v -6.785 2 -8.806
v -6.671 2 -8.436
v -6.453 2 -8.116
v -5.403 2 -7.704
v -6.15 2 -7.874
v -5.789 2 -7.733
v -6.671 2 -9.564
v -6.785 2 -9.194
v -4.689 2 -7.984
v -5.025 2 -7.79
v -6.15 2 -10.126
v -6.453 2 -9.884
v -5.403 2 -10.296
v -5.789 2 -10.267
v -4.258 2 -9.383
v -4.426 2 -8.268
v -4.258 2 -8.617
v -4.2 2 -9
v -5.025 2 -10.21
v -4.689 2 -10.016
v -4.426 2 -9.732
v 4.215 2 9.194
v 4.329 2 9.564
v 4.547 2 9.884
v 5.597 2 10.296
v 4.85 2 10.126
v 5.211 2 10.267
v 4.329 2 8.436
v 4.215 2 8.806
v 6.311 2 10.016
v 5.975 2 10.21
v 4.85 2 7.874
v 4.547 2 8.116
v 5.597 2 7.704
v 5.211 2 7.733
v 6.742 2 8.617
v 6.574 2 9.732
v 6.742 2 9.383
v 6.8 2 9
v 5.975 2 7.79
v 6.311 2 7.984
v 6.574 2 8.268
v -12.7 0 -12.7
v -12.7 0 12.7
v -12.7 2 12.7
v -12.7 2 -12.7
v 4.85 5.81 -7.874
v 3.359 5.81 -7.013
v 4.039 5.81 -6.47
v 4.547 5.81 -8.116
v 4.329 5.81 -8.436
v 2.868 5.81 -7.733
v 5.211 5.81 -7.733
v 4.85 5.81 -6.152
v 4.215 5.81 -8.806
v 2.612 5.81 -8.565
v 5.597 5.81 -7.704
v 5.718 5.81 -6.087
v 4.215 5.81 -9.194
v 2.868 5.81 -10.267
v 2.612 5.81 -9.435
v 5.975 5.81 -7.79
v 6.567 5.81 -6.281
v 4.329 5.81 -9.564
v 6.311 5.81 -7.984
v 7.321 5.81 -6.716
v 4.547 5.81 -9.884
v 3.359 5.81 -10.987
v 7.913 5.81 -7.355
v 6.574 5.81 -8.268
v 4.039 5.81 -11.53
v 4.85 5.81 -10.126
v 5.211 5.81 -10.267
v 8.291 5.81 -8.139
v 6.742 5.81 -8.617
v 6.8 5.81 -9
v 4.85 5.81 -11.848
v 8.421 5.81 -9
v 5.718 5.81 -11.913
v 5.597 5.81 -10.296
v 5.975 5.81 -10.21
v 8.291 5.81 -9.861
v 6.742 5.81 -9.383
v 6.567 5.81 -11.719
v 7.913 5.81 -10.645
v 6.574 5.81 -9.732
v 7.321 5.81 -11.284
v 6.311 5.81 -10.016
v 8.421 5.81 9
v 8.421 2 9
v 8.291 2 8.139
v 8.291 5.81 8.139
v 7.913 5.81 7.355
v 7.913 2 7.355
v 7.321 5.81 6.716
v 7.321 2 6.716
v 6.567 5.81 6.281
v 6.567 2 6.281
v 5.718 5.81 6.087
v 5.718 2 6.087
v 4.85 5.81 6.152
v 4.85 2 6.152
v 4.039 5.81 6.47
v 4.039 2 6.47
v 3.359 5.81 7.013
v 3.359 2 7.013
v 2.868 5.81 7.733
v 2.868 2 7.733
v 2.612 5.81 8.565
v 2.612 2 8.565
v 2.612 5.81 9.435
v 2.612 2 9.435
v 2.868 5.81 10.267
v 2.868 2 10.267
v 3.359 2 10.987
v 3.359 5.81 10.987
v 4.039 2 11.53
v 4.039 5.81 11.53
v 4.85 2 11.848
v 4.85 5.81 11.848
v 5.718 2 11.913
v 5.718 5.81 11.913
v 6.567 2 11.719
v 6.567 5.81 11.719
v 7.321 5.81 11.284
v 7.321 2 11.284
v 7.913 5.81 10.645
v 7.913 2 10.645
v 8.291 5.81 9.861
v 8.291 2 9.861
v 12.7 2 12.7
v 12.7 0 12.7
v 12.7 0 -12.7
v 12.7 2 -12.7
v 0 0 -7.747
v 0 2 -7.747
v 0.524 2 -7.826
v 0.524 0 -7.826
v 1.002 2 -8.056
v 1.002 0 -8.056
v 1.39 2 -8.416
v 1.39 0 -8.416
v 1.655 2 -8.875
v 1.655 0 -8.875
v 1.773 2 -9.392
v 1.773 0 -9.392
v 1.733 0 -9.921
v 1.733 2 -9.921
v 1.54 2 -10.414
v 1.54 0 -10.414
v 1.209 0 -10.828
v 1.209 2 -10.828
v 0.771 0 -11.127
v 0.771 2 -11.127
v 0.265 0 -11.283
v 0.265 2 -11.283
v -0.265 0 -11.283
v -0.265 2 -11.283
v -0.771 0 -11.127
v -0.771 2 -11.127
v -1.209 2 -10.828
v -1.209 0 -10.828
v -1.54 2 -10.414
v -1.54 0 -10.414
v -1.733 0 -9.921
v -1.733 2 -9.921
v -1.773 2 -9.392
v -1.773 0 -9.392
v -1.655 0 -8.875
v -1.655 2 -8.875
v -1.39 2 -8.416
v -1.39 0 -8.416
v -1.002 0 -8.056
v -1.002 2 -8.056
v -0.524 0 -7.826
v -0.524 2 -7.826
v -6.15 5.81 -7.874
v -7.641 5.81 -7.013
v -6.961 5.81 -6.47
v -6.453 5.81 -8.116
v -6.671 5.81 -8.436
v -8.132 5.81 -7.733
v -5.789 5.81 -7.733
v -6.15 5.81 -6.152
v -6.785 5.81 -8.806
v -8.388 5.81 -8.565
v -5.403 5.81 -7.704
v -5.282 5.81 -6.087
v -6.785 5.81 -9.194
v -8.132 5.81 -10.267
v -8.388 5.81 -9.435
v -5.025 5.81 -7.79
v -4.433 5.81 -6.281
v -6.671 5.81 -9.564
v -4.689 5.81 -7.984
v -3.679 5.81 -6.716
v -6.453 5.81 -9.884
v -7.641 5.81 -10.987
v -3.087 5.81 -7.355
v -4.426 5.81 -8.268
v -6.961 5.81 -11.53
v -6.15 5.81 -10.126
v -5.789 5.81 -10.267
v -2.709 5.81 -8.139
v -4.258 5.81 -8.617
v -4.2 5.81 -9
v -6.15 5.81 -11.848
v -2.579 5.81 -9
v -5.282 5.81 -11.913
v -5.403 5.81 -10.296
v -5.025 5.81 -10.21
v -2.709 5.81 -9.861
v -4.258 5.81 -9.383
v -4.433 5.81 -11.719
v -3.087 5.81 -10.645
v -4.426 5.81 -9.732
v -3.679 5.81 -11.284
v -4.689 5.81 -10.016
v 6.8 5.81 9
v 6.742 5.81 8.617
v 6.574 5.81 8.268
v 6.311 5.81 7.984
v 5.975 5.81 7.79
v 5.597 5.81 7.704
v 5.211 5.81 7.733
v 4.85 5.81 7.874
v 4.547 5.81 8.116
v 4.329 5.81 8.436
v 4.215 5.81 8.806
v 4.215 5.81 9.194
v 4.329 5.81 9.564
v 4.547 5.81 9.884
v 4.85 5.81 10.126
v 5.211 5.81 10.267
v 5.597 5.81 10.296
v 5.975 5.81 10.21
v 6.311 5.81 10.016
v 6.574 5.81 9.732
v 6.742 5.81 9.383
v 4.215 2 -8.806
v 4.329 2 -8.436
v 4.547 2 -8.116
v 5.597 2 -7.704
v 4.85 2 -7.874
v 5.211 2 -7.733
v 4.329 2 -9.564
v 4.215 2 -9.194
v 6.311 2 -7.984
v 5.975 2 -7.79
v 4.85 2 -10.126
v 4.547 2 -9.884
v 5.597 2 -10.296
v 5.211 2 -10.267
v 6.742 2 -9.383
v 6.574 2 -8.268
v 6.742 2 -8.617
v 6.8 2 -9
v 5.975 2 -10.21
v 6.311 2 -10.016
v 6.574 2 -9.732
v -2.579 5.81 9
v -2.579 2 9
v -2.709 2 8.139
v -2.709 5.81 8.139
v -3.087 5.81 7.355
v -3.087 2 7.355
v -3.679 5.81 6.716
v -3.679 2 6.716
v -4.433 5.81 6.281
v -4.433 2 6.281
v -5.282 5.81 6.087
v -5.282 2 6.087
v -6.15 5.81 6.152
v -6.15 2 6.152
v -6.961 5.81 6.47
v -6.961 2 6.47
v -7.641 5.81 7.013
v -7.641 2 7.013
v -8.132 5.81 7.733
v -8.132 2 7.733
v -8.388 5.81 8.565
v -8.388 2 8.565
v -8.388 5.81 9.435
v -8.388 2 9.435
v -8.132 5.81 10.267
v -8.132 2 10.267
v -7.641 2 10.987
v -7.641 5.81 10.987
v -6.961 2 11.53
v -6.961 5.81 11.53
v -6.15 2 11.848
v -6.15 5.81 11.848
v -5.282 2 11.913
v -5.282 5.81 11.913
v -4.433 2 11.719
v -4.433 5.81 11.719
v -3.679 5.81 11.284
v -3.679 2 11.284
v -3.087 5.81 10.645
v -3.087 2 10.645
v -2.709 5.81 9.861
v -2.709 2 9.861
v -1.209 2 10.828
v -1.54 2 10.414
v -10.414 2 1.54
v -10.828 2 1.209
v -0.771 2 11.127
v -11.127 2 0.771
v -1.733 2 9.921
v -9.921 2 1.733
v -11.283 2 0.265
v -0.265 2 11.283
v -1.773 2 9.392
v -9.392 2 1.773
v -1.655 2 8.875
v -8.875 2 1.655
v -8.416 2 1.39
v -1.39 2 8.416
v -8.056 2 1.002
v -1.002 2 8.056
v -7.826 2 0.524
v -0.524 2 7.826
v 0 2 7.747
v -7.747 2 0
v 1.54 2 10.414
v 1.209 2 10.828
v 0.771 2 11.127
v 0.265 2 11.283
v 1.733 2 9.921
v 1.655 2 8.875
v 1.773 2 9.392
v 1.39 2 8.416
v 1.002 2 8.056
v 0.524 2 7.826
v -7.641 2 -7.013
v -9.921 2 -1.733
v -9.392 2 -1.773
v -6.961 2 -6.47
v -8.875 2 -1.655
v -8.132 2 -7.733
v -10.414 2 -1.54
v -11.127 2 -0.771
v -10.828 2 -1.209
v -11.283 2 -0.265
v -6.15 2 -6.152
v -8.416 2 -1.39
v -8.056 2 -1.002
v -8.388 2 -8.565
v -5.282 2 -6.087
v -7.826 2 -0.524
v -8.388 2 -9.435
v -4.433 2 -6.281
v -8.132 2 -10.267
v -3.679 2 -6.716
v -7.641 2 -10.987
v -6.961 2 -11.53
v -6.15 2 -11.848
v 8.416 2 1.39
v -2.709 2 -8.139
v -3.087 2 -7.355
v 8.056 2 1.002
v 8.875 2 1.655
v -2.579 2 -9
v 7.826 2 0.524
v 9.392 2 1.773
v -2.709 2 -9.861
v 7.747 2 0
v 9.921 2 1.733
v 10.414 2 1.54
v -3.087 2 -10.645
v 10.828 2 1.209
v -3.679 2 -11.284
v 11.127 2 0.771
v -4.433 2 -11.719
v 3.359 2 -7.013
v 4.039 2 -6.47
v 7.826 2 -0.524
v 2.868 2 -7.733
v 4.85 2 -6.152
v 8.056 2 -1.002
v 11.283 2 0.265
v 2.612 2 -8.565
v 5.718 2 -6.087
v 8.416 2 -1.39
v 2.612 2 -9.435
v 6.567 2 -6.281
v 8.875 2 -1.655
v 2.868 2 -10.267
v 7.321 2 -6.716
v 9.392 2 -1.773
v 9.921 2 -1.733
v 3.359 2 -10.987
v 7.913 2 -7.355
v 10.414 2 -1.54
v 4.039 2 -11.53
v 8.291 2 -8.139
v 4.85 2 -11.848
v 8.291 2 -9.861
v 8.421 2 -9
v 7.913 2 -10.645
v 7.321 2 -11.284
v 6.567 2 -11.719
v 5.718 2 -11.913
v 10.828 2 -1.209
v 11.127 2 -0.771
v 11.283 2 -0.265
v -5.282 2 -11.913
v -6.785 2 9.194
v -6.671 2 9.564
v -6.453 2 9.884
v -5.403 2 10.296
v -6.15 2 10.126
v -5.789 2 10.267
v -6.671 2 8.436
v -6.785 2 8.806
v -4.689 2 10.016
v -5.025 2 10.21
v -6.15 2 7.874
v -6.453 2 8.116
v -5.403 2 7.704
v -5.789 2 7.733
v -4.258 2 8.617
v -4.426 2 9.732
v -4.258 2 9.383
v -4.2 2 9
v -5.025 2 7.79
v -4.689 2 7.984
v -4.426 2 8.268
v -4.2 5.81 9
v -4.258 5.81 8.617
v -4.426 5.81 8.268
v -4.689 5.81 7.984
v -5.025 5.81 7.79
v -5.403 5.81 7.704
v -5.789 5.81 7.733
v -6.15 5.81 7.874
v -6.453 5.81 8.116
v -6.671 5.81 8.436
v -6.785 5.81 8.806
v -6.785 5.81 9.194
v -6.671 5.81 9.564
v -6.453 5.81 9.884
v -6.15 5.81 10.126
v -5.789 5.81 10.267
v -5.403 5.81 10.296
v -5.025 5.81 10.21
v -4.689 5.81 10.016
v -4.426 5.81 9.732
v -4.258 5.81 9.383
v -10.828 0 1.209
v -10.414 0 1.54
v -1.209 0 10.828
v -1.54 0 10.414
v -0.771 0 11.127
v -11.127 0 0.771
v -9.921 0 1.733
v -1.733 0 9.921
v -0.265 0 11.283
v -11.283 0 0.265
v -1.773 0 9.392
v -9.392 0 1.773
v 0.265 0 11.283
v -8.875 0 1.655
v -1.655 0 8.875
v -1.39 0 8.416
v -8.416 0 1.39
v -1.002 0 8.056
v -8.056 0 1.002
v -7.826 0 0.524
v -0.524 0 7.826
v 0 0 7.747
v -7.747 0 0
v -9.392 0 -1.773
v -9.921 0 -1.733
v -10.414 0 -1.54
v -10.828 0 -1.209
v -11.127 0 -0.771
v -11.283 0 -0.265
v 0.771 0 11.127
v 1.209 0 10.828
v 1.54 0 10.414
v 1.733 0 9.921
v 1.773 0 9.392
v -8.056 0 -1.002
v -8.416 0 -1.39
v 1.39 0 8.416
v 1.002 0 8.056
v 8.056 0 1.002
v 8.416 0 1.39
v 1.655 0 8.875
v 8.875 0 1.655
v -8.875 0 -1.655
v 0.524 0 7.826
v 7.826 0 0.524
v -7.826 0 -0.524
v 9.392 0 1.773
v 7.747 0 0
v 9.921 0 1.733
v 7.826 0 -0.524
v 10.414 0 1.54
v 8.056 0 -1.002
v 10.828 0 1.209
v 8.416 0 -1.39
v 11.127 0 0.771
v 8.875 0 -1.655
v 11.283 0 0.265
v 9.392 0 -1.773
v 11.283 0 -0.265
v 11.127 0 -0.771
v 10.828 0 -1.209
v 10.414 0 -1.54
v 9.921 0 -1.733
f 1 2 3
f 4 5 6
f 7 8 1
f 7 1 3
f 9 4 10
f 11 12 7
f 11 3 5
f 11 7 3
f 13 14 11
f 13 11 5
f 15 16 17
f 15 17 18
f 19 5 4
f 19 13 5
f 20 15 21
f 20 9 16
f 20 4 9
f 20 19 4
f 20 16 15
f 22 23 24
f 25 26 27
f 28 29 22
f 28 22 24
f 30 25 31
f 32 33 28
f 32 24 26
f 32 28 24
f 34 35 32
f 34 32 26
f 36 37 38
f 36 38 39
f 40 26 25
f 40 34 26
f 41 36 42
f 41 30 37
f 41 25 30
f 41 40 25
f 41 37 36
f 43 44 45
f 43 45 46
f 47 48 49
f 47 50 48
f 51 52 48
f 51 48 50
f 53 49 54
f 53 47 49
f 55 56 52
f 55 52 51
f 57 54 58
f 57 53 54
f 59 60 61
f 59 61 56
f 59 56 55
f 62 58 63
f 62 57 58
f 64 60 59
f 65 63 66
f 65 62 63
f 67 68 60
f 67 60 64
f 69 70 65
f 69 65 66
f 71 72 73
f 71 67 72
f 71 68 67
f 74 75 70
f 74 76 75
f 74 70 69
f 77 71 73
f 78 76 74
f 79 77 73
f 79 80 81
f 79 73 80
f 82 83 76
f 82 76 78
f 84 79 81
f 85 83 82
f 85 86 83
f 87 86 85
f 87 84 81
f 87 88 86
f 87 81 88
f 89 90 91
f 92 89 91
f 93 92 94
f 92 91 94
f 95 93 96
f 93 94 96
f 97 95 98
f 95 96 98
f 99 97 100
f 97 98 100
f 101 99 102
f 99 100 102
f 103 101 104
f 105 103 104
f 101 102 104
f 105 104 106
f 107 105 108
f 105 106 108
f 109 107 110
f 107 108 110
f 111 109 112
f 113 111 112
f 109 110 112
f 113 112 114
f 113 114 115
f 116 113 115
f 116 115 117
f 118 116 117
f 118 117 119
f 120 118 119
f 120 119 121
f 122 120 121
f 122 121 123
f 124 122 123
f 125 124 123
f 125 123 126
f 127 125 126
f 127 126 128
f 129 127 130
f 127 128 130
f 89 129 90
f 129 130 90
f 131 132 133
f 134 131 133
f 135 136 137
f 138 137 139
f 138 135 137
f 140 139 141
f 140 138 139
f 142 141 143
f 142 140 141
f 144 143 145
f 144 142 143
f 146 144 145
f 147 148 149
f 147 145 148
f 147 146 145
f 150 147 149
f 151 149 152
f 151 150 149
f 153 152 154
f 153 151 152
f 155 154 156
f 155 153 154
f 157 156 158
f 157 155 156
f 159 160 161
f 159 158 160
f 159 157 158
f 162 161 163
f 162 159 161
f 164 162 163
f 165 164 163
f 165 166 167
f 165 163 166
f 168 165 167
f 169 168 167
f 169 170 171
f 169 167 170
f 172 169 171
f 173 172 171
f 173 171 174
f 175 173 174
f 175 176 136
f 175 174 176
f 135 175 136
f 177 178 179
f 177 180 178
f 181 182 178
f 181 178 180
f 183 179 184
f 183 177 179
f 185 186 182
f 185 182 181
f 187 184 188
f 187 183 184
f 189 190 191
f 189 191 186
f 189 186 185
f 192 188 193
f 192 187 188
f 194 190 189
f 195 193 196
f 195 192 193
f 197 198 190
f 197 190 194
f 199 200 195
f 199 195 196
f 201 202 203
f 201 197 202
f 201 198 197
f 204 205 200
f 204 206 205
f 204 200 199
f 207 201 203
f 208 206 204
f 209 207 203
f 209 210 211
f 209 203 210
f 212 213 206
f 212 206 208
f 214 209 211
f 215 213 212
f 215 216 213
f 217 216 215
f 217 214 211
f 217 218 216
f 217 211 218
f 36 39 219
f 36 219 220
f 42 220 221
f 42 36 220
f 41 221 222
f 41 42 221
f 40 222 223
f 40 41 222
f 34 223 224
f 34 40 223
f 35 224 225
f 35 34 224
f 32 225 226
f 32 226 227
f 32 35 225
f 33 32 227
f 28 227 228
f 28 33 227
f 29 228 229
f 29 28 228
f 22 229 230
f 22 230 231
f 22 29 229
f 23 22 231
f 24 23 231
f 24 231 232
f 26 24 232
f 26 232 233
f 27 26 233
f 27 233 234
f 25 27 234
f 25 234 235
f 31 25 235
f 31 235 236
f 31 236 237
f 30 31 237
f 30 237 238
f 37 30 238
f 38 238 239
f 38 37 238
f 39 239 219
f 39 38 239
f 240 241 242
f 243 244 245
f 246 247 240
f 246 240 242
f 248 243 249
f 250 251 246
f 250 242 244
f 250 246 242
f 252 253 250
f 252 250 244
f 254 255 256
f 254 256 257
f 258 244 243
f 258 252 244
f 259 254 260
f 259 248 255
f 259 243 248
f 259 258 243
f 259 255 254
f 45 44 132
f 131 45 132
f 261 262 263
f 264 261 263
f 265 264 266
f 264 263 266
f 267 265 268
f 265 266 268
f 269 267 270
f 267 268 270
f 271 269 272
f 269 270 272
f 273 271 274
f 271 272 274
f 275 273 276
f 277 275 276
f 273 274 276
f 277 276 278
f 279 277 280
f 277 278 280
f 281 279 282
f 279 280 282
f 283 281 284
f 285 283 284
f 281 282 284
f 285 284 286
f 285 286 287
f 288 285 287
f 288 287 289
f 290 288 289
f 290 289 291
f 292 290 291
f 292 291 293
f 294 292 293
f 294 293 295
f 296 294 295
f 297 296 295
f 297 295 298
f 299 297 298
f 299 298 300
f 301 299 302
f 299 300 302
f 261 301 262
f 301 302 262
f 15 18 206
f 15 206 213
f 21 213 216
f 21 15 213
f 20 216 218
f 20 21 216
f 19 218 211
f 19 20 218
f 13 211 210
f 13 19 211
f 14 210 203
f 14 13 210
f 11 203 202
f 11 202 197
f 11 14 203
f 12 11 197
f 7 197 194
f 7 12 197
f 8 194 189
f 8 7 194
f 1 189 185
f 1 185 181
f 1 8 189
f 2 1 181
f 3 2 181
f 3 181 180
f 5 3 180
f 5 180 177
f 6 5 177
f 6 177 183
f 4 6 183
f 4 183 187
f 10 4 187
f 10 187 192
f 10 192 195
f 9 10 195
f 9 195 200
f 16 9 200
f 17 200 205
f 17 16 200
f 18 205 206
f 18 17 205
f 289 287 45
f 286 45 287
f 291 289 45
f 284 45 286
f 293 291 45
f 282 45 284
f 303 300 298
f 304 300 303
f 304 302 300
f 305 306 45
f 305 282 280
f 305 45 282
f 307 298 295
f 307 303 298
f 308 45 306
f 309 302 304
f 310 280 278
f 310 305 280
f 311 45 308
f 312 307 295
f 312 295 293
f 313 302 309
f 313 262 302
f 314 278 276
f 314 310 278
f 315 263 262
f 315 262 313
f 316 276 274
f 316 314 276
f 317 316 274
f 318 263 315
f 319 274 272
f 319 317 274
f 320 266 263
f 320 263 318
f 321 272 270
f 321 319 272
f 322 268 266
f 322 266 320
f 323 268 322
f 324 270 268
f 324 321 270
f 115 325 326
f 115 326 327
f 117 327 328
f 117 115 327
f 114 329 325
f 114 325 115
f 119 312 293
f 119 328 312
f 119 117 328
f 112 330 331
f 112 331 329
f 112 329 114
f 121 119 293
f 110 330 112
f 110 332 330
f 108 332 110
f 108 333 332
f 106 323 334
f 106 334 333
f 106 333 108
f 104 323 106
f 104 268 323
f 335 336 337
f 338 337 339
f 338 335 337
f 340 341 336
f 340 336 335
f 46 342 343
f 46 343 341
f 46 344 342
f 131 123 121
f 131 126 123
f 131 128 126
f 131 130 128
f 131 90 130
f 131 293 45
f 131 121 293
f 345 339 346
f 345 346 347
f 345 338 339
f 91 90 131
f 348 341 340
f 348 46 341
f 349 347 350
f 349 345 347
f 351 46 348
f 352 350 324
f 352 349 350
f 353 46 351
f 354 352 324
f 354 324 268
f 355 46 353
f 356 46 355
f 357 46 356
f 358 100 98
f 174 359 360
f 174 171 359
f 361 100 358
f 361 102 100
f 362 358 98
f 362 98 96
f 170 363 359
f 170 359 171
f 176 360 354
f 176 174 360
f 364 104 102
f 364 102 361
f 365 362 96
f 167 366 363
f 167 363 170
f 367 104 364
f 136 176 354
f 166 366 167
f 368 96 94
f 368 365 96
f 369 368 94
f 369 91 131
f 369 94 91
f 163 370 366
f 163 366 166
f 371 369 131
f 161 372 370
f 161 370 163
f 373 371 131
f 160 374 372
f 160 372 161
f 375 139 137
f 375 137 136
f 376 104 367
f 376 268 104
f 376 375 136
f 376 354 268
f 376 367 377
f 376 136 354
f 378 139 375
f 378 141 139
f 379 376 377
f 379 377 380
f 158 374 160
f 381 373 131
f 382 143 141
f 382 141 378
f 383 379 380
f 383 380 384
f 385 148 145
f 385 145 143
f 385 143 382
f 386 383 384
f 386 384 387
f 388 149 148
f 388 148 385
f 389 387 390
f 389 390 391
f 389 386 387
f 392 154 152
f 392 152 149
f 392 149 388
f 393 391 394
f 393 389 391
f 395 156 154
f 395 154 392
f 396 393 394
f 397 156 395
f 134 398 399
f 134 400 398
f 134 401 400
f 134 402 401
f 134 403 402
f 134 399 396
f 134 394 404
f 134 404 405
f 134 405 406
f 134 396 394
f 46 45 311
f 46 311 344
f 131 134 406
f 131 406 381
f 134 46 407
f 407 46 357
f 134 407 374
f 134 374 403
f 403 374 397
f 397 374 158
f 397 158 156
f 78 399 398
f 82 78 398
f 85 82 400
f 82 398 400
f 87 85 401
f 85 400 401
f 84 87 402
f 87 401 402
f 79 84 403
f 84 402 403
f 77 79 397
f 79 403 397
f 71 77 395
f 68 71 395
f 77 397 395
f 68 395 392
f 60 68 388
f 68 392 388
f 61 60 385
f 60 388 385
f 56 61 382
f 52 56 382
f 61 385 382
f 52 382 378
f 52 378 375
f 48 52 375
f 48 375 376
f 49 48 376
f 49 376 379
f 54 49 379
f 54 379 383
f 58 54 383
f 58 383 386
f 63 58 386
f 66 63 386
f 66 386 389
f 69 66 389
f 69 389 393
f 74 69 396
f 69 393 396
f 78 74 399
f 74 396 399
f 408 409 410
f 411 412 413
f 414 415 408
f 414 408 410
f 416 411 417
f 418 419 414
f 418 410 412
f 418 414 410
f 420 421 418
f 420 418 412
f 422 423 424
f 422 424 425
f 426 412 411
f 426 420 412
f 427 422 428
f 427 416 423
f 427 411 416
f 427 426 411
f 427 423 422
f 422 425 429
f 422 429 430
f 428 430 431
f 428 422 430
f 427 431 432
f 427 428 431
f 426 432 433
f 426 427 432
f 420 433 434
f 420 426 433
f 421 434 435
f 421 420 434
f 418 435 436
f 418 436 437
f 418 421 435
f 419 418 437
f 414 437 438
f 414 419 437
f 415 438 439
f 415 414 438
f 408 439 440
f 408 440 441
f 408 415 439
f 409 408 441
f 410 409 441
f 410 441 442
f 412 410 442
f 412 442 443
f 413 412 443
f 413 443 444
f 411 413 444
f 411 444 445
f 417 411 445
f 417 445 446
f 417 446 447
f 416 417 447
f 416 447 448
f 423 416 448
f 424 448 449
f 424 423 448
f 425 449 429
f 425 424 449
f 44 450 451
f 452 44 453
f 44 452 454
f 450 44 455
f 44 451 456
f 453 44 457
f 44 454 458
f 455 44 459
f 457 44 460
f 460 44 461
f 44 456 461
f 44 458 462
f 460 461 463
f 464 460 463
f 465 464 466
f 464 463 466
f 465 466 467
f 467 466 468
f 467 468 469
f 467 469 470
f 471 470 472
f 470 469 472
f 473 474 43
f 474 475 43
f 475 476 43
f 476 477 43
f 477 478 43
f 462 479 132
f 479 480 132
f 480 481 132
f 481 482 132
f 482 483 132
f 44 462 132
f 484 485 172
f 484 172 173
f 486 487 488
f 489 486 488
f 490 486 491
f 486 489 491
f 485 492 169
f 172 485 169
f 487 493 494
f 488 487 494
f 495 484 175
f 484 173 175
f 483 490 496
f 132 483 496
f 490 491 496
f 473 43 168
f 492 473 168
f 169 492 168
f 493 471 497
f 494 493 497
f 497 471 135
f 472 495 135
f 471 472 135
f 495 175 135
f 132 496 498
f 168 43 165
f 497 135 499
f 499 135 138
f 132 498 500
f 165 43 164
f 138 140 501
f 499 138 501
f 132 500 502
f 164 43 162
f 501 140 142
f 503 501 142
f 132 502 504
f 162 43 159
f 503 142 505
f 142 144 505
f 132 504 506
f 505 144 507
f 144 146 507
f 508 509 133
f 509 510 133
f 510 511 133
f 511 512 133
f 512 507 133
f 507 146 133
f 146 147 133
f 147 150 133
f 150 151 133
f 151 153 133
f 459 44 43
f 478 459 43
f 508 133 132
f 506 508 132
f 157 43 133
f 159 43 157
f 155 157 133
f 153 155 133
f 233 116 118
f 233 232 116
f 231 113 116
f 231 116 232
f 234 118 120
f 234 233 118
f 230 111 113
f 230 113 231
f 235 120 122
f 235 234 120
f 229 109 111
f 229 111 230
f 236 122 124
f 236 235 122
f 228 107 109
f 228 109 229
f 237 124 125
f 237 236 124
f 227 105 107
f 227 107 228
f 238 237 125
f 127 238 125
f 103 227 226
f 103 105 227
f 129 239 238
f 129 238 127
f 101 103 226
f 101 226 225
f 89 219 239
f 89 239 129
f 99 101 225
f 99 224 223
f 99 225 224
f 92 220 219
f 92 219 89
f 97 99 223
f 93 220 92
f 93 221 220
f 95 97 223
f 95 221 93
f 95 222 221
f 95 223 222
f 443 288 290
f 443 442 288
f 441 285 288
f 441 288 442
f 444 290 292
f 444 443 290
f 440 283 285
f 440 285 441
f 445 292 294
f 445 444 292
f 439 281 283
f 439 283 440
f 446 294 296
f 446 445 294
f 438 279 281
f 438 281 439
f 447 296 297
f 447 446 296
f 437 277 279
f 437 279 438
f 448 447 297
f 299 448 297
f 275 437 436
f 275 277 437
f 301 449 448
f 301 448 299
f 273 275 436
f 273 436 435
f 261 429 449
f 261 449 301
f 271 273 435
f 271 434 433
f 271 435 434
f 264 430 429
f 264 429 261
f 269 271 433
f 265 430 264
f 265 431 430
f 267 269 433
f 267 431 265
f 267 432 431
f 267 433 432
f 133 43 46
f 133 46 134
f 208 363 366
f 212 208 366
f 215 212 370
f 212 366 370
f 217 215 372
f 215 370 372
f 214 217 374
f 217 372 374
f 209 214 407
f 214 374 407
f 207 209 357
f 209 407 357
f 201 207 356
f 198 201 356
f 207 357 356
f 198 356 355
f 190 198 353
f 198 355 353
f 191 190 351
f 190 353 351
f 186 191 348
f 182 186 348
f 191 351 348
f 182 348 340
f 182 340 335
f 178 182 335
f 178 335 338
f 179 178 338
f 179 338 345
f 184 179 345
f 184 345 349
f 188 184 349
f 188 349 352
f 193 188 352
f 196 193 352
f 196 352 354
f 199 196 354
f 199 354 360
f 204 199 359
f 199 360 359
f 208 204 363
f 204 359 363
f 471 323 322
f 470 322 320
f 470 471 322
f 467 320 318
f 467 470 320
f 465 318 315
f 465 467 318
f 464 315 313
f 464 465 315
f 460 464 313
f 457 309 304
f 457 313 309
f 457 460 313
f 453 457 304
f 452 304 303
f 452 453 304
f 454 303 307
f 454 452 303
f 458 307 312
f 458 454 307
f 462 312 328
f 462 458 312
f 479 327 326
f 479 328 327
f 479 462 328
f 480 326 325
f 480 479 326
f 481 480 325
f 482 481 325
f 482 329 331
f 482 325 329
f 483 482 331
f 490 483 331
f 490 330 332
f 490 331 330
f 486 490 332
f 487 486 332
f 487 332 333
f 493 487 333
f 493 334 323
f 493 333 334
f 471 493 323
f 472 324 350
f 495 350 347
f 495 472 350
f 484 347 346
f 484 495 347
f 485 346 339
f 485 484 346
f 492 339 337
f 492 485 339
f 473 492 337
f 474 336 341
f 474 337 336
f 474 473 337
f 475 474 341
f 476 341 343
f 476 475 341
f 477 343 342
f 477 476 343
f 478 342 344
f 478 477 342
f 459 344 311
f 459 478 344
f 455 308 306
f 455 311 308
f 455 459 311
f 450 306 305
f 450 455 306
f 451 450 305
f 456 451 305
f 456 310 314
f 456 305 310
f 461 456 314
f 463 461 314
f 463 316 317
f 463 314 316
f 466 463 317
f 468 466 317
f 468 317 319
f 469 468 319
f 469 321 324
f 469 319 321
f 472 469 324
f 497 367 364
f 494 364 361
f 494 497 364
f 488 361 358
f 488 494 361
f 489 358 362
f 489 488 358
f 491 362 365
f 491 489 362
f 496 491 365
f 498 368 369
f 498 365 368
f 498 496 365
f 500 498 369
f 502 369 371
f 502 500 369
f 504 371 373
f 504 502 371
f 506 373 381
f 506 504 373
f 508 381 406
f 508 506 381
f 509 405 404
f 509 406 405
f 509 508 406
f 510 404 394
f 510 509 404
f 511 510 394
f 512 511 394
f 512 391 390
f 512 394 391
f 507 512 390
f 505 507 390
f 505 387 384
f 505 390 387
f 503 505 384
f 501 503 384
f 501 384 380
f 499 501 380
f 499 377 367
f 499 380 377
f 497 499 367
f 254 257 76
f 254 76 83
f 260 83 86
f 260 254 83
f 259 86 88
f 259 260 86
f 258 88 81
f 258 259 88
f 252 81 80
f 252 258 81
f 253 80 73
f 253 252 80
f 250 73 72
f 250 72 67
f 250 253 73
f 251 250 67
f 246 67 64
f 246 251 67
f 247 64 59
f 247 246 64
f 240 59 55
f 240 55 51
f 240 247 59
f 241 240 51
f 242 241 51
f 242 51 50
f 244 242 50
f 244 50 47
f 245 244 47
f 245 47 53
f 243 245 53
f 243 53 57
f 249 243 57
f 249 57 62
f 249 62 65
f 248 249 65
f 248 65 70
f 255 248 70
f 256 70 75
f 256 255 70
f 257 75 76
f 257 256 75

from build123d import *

# Parameters (mm, degrees)
SKETCH1_W           = 25.4
SKETCH1_H           = 25.4
BOSS_EXTRUDE1_DEPTH = 2
SKETCH4_R           = 1.778
CUT_EXTRUDE1_DEPTH  = 3
SKETCH3_R           = 2.921
SKETCH3_R_2         = 1.3
BOSS_EXTRUDE2_DEPTH = 3.81
CIRPATTERN2_COUNT   = 4


with BuildPart() as part:
    # Sketch1 → Boss-Extrude1 (new body)
    with BuildSketch(Plane(origin=(0, 0, 0), x_dir=(1, 0, 0), z_dir=(0, 1, 0))):
        Rectangle(SKETCH1_W, SKETCH1_H)
    extrude(amount=BOSS_EXTRUDE1_DEPTH)

    # Sketch4 → Cut-Extrude1 (cut, through all)
    with BuildSketch(Plane(origin=(0, 0, 0), x_dir=(1, 0, 0), z_dir=(0, 1, 0))):
        with Locations((-9.525, 0)):
            Circle(SKETCH4_R)
    cut_extrude1 = extrude(amount=CUT_EXTRUDE1_DEPTH, mode=Mode.SUBTRACT)

    # Sketch3 → Boss-Extrude2 (add)
    with BuildSketch(Plane(origin=(0, 2, 0), x_dir=(1, 0, 0), z_dir=(0, 1, 0))):
        with Locations((-5.5, 9)):
            Circle(SKETCH3_R)
        with Locations((-5.5, 9)):
            Circle(SKETCH3_R_2, mode=Mode.SUBTRACT)
        with Locations((5.5, 9)):
            Circle(SKETCH3_R)
        with Locations((5.5, 9)):
            Circle(SKETCH3_R_2, mode=Mode.SUBTRACT)
        with Locations((5.5, -9)):
            Circle(SKETCH3_R)
        with Locations((5.5, -9)):
            Circle(SKETCH3_R_2, mode=Mode.SUBTRACT)
        with Locations((-5.5, -9)):
            Circle(SKETCH3_R)
        with Locations((-5.5, -9)):
            Circle(SKETCH3_R_2, mode=Mode.SUBTRACT)
    extrude(amount=BOSS_EXTRUDE2_DEPTH)

    # CirPattern2: Cut-Extrude1 ×4 about axis
    cirpattern2_axis = Axis((0, 0, 0), (0, 1, 0))
    for i in range(1, CIRPATTERN2_COUNT):
        add(cut_extrude1.rotate(cirpattern2_axis, i * 360 / CIRPATTERN2_COUNT), mode=Mode.SUBTRACT)


solid = part.part
